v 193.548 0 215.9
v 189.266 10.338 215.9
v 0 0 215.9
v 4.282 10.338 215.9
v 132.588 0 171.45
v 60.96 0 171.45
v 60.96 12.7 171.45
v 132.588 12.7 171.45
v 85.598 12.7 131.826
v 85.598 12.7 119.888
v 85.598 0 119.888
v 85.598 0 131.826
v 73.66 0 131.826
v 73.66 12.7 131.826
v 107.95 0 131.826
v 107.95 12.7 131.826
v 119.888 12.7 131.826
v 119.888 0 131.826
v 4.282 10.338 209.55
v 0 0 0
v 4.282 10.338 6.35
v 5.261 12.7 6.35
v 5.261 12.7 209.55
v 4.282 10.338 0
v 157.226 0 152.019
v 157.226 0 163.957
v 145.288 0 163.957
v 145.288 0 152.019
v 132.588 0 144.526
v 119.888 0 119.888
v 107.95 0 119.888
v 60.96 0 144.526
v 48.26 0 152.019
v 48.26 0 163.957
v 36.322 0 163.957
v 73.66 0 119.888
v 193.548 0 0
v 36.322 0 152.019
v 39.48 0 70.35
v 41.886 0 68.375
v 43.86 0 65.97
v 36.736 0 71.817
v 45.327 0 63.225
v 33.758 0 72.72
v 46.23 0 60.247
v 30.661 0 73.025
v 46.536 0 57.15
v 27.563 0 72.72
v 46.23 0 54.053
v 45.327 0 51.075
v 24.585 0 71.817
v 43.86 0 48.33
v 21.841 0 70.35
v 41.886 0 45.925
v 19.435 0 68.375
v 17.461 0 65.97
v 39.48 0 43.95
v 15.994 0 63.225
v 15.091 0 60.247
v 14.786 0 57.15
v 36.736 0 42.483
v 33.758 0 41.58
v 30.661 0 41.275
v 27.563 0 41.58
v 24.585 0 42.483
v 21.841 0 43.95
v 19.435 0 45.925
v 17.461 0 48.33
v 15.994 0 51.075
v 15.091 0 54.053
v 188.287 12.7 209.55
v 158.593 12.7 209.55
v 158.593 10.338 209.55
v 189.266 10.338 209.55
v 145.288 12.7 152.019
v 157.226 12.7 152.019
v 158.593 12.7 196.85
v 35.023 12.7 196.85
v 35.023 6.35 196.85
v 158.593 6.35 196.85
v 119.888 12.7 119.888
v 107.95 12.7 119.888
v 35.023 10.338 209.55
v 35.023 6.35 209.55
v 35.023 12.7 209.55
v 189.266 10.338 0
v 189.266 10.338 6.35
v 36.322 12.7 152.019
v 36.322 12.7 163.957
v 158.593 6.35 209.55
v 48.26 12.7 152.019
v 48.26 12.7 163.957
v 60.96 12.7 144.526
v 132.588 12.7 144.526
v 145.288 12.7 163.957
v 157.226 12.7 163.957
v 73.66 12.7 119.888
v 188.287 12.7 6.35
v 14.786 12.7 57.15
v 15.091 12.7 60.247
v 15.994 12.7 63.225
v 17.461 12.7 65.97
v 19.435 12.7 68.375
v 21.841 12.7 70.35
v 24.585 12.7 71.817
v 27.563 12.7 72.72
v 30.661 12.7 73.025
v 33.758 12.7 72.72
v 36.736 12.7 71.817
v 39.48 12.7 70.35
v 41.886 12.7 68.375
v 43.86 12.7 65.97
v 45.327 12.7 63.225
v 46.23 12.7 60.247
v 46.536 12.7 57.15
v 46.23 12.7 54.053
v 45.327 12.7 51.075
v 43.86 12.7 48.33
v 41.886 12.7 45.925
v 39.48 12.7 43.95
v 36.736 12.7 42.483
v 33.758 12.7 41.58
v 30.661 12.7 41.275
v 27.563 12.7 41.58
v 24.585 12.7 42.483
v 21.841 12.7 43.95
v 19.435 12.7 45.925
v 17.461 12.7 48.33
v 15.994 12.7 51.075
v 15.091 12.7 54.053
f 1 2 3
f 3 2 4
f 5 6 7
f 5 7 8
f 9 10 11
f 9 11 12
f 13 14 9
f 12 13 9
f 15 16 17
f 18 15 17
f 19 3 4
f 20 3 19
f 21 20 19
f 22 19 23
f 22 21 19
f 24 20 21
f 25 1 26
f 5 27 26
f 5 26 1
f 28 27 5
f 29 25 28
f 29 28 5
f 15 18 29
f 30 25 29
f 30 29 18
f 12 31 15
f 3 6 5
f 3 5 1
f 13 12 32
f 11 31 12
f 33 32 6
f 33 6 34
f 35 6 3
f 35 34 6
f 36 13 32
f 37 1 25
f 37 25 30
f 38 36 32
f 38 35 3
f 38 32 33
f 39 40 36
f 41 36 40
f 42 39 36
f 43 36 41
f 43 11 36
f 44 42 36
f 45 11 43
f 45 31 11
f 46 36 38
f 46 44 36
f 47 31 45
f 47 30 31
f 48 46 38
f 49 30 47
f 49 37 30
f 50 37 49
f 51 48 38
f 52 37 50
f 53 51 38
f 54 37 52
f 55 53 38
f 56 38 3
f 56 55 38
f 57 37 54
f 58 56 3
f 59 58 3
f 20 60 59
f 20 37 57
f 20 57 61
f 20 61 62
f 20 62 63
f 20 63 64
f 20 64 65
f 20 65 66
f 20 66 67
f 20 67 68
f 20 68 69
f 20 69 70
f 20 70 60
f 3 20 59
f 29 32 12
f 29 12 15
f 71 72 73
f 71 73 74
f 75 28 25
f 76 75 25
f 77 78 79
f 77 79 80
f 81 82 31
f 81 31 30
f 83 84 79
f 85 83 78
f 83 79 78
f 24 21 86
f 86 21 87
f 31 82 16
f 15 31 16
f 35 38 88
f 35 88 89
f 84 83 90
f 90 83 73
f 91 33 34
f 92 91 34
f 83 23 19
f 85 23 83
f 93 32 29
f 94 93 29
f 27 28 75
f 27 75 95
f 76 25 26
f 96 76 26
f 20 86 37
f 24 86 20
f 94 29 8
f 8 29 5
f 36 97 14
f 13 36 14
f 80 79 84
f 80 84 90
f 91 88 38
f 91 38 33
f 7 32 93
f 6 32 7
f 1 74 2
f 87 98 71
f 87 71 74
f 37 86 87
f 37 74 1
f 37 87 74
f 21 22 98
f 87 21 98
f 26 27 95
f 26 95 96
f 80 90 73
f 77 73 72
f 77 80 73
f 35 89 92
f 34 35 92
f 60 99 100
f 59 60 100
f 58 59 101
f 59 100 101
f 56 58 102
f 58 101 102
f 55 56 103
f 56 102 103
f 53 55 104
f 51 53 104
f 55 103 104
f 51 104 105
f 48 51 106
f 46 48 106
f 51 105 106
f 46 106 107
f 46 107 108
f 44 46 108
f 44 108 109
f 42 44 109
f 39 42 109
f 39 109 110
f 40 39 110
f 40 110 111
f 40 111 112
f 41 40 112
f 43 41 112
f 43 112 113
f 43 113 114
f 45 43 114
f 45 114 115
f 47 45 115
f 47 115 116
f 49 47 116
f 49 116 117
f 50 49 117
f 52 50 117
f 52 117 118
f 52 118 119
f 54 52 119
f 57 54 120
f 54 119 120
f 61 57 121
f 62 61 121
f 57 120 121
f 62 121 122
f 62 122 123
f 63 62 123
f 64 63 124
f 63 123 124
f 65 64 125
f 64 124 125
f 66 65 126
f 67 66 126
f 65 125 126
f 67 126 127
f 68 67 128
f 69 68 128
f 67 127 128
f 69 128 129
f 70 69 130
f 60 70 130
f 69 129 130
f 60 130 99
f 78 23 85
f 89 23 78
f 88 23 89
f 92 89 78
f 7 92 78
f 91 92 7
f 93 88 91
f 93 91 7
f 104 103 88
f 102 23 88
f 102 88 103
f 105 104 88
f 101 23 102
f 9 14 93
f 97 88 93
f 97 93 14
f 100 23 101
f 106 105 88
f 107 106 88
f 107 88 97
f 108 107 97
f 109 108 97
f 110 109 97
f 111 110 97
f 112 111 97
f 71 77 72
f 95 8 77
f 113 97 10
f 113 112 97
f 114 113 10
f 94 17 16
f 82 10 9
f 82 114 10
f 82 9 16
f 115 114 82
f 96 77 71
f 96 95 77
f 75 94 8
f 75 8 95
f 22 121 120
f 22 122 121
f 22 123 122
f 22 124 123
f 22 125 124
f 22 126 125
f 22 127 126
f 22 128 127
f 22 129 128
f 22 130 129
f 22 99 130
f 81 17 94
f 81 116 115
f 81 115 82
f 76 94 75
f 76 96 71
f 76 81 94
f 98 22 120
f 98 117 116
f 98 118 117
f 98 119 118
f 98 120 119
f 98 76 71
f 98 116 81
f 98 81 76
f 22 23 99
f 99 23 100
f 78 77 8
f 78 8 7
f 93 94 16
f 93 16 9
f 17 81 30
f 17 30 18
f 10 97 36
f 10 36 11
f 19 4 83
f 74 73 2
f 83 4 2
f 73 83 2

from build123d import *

# Parameters (mm, degrees)
BOSS_EXTRUDE1_DEPTH = 215.9
SKETCH2_W           = 193.548
SKETCH2_H           = 6.35
CUT_EXTRUDE1_DEPTH  = 2.3622
SKETCH3_W           = 71.628
SKETCH3_H           = 26.924
SKETCH3_W_2         = 11.938
SKETCH3_H_2         = 11.938
CUT_EXTRUDE3_DEPTH  = 291.232541773
SKETCH4_R           = 15.875
CUT_EXTRUDE4_DEPTH  = 291.232541773
CAVITY1_START       = 196.85
CAVITY1_OUTLINE_W   = 123.569632405
CAVITY1_OUTLINE_H   = 6.35
CAVITY1_DEPTH       = 12.7


# Read off the part's stored shape, not the designer's step: Cavity1
with BuildPart() as part:
    # Sketch1 → Boss-Extrude1 (new body)
    with BuildSketch(Plane.XY):
        Polygon((0, 0), (5.260512242, 12.7), (188.287487758, 12.7), (193.548, 0), align=None)
    extrude(amount=BOSS_EXTRUDE1_DEPTH)

    # Sketch2 → Cut-Extrude1 (cut)
    with BuildSketch(Plane.XZ.offset(-12.7)):
        with Locations((96.774, 3.175)):
            Rectangle(SKETCH2_W, SKETCH2_H)
        with Locations((96.774, 212.725)):
            Rectangle(SKETCH2_W, SKETCH2_H)
    extrude(amount=CUT_EXTRUDE1_DEPTH, mode=Mode.SUBTRACT)

    # Sketch3 → Cut-Extrude3 (cut, through all)
    with BuildSketch(Plane.XZ):
        with Locations((96.774, 157.988)):
            Rectangle(SKETCH3_W, SKETCH3_H)
        with Locations((79.629, 125.857)):
            Rectangle(SKETCH3_W_2, SKETCH3_H_2)
        with Locations((113.919, 125.857)):
            Rectangle(SKETCH3_W_2, SKETCH3_H_2)
        with Locations((151.257, 157.988)):
            Rectangle(SKETCH3_W_2, SKETCH3_H_2)
        with Locations((42.291, 157.988)):
            Rectangle(SKETCH3_W_2, SKETCH3_H_2)
    extrude(amount=-CUT_EXTRUDE3_DEPTH, mode=Mode.SUBTRACT)

    # Sketch4 → Cut-Extrude4 (cut, through all)
    with BuildSketch(Plane(origin=(0, 12.7, 0), x_dir=(1, 0, 0), z_dir=(0, 1, 0))):
        with Locations(Location((30.660512242, -57.15, 0), (0, 0, 180))):
            Circle(SKETCH4_R)
    extrude(amount=-CUT_EXTRUDE4_DEPTH, mode=Mode.SUBTRACT)

    # Cavity1 outline → Cavity1 (cut)
    with BuildSketch(Plane.XY.offset(CAVITY1_START)):
        with Locations((96.808185153, 9.525)):
            Rectangle(CAVITY1_OUTLINE_W, CAVITY1_OUTLINE_H)
    extrude(amount=CAVITY1_DEPTH, mode=Mode.SUBTRACT)


solid = part.part
